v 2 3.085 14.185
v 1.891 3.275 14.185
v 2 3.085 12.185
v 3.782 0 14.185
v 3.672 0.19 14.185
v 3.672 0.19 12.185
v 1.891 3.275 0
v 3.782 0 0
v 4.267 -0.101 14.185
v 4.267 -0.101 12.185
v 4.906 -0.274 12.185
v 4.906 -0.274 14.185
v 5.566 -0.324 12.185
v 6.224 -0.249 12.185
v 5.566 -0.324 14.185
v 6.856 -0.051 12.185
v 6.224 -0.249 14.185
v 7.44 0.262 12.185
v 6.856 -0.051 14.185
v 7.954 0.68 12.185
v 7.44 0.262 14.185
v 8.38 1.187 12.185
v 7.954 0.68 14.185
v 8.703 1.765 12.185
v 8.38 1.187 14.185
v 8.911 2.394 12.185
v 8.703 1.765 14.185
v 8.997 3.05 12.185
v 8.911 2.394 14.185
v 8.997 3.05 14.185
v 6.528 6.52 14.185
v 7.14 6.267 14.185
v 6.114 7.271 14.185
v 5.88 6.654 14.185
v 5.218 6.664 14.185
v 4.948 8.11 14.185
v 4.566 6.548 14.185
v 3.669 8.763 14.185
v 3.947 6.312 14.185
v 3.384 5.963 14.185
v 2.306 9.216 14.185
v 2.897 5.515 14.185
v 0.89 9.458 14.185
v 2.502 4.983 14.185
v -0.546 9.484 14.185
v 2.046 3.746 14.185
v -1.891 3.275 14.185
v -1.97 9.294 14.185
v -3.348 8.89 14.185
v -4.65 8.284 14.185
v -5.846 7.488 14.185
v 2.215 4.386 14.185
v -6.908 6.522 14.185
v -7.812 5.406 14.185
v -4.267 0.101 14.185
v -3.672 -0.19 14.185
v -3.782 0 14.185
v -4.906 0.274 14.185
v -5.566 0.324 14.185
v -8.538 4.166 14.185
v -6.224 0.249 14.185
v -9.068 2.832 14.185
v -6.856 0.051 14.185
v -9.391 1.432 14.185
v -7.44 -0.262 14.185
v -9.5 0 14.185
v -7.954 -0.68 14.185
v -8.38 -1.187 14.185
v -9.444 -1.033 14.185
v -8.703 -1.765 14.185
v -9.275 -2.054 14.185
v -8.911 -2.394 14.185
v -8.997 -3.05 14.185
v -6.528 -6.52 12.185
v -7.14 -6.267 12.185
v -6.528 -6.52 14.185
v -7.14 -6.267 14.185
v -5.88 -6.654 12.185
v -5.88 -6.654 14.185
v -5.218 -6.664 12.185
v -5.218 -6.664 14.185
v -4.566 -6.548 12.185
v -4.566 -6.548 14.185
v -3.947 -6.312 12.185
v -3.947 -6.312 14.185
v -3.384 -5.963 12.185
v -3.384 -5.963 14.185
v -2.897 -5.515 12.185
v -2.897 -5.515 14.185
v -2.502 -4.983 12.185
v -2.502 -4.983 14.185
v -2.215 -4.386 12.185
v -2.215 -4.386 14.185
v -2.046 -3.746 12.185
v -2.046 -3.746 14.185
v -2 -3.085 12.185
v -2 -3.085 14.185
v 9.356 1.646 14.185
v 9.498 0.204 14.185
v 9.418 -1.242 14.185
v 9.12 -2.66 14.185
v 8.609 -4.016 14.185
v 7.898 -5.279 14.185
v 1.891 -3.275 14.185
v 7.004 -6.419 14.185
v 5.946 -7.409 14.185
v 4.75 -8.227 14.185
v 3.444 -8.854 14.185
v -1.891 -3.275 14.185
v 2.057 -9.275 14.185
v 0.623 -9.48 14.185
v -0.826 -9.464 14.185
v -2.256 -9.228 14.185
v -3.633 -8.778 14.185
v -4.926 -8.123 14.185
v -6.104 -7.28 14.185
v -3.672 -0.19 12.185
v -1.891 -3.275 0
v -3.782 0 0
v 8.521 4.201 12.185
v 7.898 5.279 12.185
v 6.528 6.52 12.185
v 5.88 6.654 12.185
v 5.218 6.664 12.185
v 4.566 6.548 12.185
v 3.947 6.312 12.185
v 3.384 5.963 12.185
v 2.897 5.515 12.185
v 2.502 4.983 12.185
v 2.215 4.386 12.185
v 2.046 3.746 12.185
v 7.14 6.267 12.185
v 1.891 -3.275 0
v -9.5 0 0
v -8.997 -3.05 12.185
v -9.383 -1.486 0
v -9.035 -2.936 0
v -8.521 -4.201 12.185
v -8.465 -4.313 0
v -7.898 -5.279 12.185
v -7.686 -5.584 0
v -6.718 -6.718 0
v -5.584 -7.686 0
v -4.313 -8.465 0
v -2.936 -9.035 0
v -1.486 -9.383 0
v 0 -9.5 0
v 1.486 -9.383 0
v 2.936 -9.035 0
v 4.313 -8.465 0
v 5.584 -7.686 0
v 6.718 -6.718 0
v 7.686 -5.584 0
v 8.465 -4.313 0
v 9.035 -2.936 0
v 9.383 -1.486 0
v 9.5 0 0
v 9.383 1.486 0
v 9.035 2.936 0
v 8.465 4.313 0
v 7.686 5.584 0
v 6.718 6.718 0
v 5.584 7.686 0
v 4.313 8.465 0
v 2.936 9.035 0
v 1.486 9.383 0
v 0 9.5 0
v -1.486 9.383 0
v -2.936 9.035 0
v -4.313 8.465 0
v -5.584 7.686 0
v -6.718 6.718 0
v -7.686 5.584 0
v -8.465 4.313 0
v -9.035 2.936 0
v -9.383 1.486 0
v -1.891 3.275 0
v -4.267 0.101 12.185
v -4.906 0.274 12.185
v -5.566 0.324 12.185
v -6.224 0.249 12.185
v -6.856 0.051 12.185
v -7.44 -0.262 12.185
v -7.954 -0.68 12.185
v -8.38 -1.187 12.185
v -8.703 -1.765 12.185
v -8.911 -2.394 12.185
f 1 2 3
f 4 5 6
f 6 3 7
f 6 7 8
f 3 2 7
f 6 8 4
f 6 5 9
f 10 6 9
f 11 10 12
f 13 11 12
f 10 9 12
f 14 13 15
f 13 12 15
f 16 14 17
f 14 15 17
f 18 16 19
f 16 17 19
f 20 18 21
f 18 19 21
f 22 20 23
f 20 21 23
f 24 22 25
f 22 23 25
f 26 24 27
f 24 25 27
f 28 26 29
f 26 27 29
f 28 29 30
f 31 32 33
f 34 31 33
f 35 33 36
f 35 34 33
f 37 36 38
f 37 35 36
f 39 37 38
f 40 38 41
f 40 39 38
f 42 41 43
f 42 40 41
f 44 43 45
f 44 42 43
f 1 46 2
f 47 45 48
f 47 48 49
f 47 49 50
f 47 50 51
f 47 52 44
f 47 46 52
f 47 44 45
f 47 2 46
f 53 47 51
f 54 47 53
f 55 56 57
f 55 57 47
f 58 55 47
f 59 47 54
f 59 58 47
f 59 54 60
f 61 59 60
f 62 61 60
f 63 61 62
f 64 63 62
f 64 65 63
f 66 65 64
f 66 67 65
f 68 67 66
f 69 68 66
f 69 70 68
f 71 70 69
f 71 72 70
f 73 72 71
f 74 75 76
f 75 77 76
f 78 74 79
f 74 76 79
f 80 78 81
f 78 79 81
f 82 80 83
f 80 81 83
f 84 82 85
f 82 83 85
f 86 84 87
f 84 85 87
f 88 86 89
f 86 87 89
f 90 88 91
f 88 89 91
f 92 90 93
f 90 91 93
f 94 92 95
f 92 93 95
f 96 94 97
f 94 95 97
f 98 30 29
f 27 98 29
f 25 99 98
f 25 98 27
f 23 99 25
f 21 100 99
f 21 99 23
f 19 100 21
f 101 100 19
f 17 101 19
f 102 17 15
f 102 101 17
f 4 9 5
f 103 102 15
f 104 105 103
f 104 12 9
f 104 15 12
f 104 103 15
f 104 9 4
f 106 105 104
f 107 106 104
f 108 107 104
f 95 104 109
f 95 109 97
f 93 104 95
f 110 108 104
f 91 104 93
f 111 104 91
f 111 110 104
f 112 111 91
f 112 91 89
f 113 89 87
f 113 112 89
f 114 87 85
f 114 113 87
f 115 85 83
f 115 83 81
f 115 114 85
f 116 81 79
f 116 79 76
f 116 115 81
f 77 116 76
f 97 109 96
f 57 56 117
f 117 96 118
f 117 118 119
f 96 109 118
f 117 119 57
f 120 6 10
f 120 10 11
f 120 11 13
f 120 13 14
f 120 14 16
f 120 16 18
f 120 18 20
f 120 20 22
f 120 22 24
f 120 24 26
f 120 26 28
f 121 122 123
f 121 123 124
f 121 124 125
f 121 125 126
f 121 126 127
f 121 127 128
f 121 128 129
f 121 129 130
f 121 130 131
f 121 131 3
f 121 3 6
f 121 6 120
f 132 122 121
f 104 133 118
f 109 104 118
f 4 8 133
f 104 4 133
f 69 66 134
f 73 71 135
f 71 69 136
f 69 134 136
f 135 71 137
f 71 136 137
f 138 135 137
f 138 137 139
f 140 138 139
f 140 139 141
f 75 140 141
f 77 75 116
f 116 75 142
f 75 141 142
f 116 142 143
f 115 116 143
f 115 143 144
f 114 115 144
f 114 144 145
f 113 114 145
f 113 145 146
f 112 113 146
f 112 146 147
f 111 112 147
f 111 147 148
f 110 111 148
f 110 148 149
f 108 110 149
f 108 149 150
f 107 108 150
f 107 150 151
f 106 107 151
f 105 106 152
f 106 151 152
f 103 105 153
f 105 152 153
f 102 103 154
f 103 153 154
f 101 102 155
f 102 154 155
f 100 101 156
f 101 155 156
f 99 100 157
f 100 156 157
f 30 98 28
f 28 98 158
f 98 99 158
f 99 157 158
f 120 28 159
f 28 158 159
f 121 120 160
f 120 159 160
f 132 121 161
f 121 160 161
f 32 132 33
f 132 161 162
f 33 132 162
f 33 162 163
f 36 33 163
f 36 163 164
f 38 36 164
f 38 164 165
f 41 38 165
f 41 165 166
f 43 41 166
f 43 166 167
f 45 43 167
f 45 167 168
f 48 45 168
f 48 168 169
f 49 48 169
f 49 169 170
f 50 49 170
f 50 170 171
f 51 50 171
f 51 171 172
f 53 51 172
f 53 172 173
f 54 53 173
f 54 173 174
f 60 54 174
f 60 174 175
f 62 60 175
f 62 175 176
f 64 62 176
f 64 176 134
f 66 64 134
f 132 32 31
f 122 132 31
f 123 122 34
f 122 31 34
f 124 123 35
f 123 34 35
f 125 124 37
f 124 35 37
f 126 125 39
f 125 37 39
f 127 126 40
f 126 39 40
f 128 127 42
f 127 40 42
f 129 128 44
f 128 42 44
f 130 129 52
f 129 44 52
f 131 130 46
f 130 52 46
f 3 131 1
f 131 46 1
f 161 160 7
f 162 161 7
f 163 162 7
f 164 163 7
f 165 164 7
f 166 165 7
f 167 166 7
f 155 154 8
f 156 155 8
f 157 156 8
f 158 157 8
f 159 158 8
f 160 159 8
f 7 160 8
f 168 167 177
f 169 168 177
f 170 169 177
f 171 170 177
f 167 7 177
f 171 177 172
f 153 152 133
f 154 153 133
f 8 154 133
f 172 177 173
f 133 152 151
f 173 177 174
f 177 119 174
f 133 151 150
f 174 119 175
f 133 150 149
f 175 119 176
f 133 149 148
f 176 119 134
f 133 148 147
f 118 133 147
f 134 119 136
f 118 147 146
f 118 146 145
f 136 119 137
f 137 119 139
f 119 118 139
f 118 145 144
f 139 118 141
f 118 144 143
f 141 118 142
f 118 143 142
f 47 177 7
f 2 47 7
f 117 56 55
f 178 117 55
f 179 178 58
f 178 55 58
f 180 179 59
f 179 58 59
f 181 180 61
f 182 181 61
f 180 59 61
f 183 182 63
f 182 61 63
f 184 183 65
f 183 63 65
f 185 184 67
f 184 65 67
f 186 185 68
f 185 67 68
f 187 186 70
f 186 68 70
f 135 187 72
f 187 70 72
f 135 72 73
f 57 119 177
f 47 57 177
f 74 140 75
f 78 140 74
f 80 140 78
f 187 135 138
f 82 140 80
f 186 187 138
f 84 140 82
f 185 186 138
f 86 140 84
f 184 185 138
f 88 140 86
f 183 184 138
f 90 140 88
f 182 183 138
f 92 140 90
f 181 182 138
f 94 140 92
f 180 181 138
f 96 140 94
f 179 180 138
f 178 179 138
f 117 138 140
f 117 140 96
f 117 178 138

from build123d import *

# Parameters (mm, degrees)
SKETCH1_R           = 9.5
BOSS_EXTRUDE1_DEPTH = 14.185
SKETCH2_R           = 3.5
CUT_EXTRUDE1_DEPTH  = 2


with BuildPart() as part:
    # Sketch1 → Boss-Extrude1 (new body)
    with BuildSketch(Plane.XY):
        with Locations(Location((0, 0, 0), (0, 0, 180))):
            Circle(SKETCH1_R)
        Polygon((1.890822132, -3.275), (-1.890822132, -3.275), (-3.781644263, 0), (-1.890822132, 3.275), (1.890822132, 3.275), (3.781644263, 0), align=None, mode=Mode.SUBTRACT)
    extrude(amount=BOSS_EXTRUDE1_DEPTH)

    # Sketch2 → Cut-Extrude1 (cut)
    with BuildSketch(Plane.XY.offset(14.185)):
        with Locations((5.499261314, 3.175)):
            Circle(SKETCH2_R)
        with Locations((-5.499261314, -3.175)):
            Circle(SKETCH2_R)
    extrude(amount=-CUT_EXTRUDE1_DEPTH, mode=Mode.SUBTRACT)


solid = part.part
